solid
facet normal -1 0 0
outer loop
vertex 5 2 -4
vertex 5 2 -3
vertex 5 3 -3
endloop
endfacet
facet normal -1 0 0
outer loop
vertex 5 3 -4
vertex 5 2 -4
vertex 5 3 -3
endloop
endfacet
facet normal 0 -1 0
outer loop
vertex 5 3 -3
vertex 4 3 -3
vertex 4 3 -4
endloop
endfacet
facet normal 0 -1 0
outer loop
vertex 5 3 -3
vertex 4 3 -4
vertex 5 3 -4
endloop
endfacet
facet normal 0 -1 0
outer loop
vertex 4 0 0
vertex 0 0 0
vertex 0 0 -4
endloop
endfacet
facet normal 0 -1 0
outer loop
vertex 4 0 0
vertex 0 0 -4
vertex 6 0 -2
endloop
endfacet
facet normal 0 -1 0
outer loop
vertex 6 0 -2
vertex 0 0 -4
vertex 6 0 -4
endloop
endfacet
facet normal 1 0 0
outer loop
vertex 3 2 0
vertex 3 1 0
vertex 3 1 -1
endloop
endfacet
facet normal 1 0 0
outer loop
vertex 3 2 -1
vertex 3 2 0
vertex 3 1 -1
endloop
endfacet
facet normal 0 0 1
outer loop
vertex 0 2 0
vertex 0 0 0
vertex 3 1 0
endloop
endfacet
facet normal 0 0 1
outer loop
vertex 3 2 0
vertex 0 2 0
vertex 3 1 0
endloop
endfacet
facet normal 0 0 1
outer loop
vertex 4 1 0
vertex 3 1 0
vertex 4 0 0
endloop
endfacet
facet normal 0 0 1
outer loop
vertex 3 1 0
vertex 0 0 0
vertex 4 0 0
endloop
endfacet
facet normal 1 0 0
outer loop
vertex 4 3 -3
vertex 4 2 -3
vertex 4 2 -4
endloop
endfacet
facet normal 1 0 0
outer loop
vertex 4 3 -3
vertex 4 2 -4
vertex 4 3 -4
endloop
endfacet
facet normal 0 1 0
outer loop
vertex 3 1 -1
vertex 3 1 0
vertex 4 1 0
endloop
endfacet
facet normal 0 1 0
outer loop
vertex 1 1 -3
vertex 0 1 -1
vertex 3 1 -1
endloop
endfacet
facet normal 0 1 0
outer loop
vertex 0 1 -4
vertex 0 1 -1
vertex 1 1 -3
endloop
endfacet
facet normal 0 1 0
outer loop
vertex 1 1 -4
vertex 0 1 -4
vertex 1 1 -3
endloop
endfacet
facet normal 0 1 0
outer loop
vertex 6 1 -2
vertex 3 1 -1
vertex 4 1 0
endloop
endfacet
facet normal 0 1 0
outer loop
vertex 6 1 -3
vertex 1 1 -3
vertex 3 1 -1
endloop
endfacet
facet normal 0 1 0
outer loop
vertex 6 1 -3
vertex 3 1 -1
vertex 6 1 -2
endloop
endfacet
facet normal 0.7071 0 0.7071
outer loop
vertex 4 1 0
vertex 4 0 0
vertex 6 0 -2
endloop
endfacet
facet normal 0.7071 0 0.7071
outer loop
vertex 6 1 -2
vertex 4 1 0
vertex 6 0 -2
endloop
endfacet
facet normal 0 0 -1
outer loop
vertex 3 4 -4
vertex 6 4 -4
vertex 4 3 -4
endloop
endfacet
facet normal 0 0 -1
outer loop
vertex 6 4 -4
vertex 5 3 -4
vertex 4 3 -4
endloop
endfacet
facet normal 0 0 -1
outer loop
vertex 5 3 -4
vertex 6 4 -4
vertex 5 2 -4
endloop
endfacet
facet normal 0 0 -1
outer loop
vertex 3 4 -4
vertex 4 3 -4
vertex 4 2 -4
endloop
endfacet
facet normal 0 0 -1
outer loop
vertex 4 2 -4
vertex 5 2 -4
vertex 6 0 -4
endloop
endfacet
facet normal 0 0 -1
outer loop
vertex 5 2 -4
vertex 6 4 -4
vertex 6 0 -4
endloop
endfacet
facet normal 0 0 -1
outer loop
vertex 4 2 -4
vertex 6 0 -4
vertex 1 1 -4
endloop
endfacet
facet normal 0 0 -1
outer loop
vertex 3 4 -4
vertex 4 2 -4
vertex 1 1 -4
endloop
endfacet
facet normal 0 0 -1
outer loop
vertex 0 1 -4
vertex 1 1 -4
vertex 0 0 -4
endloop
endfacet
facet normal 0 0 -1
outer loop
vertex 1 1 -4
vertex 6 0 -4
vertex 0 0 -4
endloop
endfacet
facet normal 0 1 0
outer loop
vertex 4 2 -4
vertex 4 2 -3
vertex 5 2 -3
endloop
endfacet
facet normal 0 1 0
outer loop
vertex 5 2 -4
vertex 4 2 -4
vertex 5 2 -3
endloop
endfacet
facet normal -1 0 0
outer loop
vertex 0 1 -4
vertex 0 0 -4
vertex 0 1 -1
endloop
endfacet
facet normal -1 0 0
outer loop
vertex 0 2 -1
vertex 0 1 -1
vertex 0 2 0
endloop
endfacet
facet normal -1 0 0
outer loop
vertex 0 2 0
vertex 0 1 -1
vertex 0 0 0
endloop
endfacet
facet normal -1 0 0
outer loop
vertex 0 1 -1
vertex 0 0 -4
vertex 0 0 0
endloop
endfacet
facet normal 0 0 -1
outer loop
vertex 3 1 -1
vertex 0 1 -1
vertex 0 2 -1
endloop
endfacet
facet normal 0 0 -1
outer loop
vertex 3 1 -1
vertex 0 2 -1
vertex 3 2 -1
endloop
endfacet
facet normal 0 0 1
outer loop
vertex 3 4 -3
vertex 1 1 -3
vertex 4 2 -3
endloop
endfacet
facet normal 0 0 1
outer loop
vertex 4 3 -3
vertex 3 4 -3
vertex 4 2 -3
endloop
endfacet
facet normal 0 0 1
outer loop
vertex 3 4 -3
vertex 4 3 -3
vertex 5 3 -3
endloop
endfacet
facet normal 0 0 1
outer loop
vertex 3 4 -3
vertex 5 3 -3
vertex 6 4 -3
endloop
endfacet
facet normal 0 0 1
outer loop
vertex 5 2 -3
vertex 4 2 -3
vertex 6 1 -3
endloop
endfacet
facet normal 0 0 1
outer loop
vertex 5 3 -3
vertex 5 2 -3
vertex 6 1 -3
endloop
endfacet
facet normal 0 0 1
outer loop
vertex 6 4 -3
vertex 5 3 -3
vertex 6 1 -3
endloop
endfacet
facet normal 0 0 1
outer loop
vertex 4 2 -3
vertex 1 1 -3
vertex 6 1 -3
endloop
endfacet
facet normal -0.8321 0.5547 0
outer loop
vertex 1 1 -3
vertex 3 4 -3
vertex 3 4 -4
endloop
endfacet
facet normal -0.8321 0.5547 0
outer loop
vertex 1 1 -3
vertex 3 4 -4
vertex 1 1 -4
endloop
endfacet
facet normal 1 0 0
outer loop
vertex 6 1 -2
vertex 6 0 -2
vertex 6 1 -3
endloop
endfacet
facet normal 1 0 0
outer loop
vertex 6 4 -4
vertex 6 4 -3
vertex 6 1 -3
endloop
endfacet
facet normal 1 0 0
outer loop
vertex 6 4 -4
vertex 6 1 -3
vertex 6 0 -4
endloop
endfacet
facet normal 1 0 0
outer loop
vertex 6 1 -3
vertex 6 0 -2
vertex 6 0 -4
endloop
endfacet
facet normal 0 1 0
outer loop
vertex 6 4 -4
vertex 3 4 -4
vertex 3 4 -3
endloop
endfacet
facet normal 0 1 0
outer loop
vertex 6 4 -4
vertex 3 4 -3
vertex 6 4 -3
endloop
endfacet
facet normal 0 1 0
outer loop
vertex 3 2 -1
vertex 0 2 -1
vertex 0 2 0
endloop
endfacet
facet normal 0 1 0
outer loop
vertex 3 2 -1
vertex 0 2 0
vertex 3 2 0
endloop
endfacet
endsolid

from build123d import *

# Parameters (mm, degrees)
EXTRUDE_1_DEPTH     = 1
SKETCH_1_3_W        = 3
SKETCH_1_3_H        = 1
EXTRUDE_2_DEPTH     = 2
SKETCH_1_4_W        = 5
SKETCH_1_4_H        = 1
EXTRUDE_3_DEPTH     = 4
SKETCH_2_W          = 1
SKETCH_2_H          = 1
CUT_EXTRUDE_1_DEPTH = 4


with BuildPart() as part:
    # 草圖1 → 填料-伸長1 (new body)
    with BuildSketch(Plane(origin=(0, 0, 0), x_dir=(1, 0, 0), z_dir=(0, 1, 0))):
        Polygon((4, 0), (6, 2), (6, 4), (0, 4), (0, 0), align=None)
    extrude(amount=EXTRUDE_1_DEPTH)

    # 草圖1<3> → 填料-伸長2 (add)
    with BuildSketch(Plane(origin=(0, 0, 0), x_dir=(1, 0, 0), z_dir=(0, 1, 0))):
        with Locations((1.5, 0.5)):
            Rectangle(SKETCH_1_3_W, SKETCH_1_3_H)
    extrude(amount=EXTRUDE_2_DEPTH)

    # 草圖1<4> → 填料-伸長3 (add)
    with BuildSketch(Plane(origin=(0, 0, 0), x_dir=(1, 0, 0), z_dir=(0, 1, 0))):
        with Locations((3.5, 3.5)):
            Rectangle(SKETCH_1_4_W, SKETCH_1_4_H)
    extrude(amount=EXTRUDE_3_DEPTH)

    # 草圖2 → 除料-伸長1 (cut)
    with BuildSketch(Plane.XY.offset(-3)):
        with Locations((4.5, 2.5)):
            Rectangle(SKETCH_2_W, SKETCH_2_H)
        Polygon((1, 4), (3, 4), (1, 1), align=None)
    extrude(amount=-CUT_EXTRUDE_1_DEPTH, mode=Mode.SUBTRACT)


solid = part.part
